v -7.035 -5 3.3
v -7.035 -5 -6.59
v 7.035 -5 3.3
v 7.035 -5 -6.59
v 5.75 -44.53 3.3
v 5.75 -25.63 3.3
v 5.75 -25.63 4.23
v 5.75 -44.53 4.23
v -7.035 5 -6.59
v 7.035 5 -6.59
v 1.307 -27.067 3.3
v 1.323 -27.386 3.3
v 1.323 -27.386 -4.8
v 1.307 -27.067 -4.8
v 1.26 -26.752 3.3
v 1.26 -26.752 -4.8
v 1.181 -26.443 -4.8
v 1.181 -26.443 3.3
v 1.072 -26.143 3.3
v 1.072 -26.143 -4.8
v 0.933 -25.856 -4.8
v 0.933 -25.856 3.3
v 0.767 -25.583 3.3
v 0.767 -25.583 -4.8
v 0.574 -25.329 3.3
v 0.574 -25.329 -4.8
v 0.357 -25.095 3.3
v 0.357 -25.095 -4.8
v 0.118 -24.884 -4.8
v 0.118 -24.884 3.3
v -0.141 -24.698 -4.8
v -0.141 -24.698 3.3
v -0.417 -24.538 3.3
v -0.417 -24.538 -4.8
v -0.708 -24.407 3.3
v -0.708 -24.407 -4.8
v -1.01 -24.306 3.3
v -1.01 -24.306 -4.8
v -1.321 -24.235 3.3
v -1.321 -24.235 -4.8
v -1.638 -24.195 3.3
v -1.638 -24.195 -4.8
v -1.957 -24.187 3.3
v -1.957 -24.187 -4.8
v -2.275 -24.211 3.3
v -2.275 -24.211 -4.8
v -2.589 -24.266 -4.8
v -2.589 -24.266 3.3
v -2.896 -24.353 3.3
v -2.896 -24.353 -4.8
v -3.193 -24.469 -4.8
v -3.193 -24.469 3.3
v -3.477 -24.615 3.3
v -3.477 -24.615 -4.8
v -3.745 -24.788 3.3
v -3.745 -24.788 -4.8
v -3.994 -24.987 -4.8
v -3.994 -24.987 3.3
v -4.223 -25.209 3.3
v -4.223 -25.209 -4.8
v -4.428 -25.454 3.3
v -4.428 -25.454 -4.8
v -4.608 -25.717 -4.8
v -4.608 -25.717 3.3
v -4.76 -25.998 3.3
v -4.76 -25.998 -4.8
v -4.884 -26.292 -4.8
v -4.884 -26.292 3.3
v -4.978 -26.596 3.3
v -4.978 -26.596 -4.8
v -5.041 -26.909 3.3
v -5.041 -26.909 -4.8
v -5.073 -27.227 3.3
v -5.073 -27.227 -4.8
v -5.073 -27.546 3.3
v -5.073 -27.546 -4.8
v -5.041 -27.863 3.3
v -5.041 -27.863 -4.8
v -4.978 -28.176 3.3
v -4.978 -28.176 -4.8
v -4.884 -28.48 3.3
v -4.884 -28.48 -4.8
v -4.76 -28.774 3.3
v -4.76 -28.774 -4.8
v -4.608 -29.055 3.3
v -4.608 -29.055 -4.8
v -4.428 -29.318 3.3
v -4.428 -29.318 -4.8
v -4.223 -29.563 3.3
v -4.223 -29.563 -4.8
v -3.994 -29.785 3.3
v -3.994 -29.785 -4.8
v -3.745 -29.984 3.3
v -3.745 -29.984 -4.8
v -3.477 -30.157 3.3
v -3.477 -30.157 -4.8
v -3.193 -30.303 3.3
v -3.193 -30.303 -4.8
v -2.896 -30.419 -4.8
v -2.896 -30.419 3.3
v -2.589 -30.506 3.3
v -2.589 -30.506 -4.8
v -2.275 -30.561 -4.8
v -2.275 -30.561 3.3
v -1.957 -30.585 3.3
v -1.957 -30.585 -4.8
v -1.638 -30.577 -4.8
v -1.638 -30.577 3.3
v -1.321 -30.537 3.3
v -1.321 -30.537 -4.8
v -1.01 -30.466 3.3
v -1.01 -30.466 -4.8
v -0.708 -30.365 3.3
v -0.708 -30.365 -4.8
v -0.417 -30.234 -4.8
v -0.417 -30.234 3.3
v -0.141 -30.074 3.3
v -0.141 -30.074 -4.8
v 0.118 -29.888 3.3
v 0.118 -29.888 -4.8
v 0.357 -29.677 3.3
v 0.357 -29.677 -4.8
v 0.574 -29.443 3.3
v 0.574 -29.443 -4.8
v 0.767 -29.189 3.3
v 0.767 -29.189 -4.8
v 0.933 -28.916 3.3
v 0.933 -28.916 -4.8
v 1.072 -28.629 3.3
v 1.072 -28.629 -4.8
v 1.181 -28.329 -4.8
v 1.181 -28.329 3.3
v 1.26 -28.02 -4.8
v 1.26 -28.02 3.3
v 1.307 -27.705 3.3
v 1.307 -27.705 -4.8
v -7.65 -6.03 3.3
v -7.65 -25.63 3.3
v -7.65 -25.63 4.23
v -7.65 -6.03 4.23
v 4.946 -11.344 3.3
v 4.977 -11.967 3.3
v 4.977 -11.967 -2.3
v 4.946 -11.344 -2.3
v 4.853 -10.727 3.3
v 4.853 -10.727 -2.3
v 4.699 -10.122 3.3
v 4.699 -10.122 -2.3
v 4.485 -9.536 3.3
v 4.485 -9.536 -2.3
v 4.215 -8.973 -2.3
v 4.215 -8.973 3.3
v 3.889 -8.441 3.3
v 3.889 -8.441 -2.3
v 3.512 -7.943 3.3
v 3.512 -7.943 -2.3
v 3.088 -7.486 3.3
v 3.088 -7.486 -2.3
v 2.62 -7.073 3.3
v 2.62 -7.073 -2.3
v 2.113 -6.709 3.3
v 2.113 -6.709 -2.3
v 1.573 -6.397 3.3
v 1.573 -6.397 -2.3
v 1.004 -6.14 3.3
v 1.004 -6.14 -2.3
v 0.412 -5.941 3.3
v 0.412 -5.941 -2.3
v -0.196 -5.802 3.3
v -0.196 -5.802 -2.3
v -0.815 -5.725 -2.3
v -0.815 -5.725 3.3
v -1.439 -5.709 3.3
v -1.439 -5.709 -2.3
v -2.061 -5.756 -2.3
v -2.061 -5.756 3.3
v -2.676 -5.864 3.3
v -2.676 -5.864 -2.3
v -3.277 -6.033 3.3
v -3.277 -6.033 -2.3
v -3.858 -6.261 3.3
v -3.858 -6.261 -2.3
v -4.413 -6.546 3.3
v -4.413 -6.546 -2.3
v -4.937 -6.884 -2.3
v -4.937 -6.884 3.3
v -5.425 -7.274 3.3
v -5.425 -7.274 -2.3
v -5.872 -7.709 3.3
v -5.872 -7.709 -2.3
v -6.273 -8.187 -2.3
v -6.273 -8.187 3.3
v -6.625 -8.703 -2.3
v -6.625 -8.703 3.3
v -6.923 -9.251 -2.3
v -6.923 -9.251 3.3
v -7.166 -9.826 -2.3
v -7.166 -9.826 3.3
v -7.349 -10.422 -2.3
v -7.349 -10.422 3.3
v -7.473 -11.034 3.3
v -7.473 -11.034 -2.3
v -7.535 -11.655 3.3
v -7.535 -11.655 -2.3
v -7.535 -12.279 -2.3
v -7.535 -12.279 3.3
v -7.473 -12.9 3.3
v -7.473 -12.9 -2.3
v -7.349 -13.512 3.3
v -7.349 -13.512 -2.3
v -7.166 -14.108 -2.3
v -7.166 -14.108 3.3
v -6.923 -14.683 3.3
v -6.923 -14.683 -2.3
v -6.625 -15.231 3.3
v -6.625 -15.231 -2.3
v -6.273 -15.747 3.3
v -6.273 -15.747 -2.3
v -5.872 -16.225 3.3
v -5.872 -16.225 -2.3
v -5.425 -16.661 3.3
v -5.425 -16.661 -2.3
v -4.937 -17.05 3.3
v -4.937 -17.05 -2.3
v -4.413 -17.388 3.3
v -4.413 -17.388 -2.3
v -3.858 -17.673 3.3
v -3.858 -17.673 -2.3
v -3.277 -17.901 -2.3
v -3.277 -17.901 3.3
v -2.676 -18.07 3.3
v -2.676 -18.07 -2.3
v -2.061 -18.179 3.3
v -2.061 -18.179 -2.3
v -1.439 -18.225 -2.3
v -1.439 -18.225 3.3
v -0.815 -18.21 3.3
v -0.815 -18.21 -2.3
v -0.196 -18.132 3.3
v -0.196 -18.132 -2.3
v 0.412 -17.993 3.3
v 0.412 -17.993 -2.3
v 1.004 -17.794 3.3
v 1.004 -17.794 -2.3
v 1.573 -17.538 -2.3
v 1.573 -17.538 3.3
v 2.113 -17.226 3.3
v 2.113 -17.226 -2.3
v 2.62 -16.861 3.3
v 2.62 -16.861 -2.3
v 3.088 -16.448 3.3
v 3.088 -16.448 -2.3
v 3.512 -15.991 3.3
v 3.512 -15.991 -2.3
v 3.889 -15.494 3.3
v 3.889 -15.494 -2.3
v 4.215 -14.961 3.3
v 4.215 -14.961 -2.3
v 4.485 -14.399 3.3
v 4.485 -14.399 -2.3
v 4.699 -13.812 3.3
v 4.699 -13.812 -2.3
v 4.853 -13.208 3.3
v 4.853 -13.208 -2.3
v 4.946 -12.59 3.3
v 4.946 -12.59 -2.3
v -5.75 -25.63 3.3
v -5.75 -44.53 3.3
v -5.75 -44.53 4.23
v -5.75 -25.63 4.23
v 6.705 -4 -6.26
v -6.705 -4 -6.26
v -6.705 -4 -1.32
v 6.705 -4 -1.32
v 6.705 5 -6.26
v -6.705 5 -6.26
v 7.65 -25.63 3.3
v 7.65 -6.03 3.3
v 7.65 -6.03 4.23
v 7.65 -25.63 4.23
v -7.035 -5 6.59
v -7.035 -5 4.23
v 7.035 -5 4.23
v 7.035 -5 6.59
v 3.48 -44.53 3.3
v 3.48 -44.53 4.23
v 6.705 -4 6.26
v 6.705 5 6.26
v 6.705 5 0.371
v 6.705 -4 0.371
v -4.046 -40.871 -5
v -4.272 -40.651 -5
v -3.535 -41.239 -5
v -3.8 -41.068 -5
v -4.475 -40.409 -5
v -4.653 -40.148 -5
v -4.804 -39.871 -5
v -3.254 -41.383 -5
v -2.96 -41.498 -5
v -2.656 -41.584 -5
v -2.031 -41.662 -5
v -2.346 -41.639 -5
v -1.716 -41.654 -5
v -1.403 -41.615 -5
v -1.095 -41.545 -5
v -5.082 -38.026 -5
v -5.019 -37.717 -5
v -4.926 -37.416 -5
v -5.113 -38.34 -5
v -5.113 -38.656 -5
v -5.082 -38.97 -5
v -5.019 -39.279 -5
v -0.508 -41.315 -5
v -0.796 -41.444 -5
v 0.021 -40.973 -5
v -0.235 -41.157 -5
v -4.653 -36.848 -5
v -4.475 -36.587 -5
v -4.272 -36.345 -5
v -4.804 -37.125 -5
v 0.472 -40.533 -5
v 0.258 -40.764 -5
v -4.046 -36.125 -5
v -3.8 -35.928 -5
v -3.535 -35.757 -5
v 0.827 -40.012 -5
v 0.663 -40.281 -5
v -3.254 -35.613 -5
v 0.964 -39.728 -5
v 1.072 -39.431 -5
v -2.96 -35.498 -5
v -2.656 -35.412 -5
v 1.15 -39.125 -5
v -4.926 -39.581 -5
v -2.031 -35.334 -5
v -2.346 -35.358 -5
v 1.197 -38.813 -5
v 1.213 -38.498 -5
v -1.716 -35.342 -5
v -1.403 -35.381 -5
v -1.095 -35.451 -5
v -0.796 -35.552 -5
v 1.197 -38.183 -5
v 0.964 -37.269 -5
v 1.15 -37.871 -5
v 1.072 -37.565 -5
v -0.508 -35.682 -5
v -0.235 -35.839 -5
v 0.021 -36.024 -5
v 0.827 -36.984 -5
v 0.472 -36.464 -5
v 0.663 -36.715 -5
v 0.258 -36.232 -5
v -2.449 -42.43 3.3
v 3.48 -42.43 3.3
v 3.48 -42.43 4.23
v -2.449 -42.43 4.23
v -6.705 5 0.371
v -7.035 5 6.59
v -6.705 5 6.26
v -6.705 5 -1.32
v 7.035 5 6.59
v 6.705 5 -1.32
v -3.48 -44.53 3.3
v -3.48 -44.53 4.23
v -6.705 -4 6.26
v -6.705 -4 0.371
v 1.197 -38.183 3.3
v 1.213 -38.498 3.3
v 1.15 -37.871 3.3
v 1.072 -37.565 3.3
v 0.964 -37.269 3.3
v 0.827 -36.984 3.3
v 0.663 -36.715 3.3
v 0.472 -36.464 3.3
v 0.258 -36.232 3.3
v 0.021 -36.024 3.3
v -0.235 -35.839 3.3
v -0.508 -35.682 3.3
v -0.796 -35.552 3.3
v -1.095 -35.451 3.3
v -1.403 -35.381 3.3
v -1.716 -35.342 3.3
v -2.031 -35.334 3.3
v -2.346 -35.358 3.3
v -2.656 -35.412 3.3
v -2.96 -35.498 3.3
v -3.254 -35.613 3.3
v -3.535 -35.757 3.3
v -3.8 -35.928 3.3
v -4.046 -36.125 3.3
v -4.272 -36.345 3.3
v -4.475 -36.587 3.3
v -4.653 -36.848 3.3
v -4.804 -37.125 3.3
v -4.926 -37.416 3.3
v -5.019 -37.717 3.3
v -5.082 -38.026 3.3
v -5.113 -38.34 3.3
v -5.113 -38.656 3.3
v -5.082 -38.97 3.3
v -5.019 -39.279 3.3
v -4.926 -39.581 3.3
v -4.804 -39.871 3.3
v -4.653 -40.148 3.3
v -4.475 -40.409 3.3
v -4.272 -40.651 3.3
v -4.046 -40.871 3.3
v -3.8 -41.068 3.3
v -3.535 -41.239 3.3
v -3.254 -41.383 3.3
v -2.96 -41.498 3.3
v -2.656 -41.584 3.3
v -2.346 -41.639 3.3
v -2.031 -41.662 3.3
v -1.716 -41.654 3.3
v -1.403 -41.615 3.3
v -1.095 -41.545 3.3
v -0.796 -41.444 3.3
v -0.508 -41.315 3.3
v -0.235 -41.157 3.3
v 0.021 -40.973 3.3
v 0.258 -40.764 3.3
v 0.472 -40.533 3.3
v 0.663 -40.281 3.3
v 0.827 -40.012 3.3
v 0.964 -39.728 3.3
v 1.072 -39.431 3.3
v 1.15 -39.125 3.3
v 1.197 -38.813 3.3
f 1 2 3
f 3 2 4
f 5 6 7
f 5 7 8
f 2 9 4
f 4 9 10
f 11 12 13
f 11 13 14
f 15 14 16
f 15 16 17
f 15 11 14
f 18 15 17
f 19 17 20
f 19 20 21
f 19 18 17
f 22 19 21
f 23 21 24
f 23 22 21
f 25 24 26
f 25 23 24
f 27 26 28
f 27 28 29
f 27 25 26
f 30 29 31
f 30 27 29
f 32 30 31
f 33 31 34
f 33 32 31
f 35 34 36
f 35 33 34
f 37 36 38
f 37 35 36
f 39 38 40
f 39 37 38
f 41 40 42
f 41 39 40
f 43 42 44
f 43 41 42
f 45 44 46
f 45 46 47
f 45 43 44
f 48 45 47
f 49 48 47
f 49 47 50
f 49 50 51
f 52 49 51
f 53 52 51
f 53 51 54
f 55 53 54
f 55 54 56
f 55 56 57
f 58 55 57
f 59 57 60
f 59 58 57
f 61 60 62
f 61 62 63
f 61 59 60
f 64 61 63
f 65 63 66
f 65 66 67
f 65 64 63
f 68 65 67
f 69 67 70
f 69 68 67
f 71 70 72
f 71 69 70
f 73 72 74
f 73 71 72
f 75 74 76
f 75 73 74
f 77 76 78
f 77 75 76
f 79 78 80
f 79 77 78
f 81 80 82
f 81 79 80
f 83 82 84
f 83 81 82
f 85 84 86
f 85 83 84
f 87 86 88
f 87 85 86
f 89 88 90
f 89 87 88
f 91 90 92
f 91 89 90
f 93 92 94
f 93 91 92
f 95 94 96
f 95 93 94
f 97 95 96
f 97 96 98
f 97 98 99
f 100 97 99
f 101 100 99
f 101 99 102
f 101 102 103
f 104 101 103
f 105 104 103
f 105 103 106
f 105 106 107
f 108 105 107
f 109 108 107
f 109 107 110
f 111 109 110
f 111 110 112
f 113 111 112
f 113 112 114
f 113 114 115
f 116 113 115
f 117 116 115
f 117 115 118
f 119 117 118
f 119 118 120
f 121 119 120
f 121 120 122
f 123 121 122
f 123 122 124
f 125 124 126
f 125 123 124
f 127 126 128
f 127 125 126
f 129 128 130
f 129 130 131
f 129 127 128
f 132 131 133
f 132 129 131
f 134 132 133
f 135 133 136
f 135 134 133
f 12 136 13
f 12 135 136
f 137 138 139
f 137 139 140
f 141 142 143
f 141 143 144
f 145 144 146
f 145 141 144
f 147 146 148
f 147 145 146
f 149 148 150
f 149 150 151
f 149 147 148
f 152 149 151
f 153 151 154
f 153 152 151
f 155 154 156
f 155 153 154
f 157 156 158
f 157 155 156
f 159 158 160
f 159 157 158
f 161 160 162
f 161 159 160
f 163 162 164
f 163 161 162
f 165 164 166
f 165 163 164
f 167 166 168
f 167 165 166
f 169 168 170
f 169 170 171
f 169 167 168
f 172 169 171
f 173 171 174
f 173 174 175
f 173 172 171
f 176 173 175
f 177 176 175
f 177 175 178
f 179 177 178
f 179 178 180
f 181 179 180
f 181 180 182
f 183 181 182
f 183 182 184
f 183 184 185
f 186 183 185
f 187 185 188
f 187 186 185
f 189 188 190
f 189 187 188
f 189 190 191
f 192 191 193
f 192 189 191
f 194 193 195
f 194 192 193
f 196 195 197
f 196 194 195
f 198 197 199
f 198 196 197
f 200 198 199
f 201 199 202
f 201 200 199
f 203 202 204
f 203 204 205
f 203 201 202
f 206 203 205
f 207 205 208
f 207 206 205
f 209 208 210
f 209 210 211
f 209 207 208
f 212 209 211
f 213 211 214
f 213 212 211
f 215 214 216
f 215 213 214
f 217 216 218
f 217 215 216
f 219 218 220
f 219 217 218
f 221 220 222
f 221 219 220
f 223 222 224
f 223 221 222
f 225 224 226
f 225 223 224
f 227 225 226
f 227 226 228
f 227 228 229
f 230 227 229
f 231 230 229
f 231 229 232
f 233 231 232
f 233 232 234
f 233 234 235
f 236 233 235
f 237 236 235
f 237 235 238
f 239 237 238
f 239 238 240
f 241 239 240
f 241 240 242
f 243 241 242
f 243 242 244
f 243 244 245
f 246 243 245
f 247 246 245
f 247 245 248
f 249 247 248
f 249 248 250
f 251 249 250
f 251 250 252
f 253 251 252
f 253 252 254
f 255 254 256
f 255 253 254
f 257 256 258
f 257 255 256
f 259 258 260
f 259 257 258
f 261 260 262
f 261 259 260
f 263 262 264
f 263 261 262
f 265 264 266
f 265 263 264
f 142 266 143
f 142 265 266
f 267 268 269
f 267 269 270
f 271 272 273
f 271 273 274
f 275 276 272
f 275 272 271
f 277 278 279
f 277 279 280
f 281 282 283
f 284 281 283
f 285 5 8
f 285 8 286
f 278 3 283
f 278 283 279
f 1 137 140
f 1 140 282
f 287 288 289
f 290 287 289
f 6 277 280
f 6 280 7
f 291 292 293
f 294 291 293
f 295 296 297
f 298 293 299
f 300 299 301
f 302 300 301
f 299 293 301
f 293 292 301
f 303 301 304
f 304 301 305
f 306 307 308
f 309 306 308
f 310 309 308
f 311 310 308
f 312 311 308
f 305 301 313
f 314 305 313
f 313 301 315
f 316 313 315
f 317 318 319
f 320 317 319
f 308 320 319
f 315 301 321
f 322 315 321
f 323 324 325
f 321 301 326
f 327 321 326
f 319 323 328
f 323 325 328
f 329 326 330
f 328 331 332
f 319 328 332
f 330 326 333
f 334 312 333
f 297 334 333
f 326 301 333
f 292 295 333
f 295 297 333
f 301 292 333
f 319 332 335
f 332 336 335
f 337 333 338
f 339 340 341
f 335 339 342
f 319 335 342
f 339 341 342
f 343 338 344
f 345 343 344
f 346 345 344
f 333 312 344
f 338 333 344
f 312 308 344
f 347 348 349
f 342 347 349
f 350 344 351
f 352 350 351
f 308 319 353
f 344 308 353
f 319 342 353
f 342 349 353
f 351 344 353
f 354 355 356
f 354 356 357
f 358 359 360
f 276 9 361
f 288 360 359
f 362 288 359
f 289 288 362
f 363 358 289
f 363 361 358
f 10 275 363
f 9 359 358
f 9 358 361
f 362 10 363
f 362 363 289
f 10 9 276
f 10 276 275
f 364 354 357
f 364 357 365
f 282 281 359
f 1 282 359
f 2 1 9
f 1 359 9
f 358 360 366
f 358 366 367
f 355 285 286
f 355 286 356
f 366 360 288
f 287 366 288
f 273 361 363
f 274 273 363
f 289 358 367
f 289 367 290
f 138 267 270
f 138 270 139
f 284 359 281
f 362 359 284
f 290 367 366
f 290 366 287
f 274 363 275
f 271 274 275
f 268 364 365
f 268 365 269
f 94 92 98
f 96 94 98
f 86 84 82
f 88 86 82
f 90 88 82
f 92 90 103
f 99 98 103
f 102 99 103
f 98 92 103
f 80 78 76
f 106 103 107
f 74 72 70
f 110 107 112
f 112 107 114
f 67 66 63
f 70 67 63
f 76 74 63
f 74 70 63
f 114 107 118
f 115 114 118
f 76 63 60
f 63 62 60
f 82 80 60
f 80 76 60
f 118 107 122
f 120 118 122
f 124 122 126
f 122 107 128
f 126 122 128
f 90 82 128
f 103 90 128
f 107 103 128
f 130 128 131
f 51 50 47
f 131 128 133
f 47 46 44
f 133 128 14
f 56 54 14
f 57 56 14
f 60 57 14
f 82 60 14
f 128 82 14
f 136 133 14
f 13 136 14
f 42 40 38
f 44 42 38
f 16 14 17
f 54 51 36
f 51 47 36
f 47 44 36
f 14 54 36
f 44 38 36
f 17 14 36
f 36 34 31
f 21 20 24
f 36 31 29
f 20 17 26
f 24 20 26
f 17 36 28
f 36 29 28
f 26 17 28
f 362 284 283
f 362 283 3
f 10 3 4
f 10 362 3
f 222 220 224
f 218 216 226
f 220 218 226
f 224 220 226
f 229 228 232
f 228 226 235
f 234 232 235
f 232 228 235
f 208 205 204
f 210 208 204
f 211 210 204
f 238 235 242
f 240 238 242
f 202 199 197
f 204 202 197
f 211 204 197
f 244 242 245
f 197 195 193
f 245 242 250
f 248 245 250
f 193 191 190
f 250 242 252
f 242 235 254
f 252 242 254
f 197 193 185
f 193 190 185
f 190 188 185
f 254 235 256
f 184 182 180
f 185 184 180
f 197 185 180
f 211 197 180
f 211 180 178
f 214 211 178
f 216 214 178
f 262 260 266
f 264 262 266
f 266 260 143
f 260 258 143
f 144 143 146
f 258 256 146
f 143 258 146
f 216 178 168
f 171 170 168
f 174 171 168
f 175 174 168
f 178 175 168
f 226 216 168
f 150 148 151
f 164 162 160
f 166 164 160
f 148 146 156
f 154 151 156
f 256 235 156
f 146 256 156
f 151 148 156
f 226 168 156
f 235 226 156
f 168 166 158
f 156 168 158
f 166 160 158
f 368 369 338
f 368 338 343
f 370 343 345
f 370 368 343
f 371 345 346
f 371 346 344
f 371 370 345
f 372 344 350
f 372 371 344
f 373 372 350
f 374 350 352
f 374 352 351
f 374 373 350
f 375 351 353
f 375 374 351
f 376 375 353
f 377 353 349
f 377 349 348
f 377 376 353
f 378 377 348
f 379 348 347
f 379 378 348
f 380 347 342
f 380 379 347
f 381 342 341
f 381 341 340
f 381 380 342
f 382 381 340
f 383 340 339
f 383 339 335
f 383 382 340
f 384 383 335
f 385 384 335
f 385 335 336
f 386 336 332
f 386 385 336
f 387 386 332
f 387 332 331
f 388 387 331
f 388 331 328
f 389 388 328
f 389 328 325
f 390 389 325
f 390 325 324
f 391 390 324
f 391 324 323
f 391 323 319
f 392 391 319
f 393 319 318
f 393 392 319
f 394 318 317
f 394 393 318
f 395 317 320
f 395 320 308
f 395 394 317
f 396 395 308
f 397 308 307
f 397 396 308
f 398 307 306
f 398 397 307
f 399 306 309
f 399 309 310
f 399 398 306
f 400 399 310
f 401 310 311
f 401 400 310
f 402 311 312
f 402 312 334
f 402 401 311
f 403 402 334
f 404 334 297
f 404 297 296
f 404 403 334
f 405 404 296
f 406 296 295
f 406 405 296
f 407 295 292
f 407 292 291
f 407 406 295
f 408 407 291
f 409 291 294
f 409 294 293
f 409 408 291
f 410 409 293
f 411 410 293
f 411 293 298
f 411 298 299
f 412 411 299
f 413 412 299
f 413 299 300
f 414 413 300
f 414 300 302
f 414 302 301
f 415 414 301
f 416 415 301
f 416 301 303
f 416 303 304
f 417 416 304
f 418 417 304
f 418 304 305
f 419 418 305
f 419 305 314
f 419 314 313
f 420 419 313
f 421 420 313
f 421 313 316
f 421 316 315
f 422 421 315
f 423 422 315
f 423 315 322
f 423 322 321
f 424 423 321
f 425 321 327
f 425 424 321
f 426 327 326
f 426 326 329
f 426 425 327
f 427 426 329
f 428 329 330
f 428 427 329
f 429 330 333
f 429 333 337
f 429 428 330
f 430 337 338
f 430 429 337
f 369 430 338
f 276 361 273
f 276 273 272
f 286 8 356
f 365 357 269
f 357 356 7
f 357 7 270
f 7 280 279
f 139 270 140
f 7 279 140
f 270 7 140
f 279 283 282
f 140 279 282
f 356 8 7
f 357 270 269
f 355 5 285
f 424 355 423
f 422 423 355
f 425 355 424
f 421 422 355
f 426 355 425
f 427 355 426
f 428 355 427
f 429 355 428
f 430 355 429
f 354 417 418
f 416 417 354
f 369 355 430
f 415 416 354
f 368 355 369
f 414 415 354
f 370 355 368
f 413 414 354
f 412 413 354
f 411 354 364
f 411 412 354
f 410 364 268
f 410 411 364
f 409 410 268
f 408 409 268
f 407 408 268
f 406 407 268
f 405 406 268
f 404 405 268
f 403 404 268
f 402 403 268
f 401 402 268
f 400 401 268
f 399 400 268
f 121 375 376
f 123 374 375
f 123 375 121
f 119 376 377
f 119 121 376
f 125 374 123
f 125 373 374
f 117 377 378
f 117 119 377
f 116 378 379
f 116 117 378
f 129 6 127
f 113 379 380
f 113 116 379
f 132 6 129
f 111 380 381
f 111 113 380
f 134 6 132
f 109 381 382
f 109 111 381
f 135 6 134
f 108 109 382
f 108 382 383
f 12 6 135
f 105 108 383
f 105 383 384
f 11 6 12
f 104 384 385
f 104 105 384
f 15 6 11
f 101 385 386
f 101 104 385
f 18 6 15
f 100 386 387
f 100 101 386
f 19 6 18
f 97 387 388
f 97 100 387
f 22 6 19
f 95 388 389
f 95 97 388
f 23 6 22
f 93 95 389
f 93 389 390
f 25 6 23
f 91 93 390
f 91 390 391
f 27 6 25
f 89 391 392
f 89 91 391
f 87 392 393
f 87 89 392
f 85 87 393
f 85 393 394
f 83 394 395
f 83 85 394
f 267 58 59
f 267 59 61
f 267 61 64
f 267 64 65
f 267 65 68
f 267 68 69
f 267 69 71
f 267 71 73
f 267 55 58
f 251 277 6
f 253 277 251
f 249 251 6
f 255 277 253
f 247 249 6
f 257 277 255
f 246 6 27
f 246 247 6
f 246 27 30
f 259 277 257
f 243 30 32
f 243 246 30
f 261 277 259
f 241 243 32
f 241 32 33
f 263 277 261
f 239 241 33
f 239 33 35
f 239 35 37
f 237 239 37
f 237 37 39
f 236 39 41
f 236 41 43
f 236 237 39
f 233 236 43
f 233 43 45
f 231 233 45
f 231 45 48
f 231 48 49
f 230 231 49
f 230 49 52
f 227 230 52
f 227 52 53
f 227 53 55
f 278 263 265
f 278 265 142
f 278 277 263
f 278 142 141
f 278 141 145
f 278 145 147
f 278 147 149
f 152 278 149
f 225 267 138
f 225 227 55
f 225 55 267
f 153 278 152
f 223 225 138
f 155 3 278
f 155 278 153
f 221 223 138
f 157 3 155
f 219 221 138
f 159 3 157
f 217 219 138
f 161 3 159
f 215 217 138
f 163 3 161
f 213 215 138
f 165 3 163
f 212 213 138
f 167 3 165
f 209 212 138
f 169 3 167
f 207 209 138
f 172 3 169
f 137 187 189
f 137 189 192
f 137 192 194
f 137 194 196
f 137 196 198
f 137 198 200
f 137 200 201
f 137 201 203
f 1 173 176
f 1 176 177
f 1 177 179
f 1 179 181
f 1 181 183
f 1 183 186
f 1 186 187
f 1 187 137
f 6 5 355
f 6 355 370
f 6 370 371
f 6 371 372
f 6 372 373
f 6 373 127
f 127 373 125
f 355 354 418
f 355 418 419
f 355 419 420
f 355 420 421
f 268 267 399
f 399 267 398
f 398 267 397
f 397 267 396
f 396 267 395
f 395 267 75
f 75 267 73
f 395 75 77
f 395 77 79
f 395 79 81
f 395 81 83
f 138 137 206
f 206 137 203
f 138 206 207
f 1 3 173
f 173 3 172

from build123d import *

# Parameters (mm, degrees)
SKETCH1_W           = 14.07
SKETCH1_H           = 13.18
BOSS_EXTRUDE1_DEPTH = 5
SKETCH2_W           = 13.41
SKETCH2_H           = 4.94
SKETCH2_H_2         = 5.888730893
CUT_EXTRUDE1_DEPTH  = 9
BOSS_EXTRUDE2_START = 3.3
BOSS_EXTRUDE2_DEPTH = 0.93
BOSS_EXTRUDE3_START = 3.3
SKETCH5_R           = 6.26
BOSS_EXTRUDE3_DEPTH = 5.6
BOSS_EXTRUDE4_START = 3.3
SKETCH7_R           = 3.2
BOSS_EXTRUDE4_DEPTH = 8.1
BOSS_EXTRUDE5_START = 3.3
SKETCH8_R           = 3.165
BOSS_EXTRUDE5_DEPTH = 8.3


with BuildPart() as part:
    # Sketch1 → Boss-Extrude1 (new body, symmetric)
    with BuildSketch(Plane(origin=(0, 0, 0), x_dir=(1, 0, 0), z_dir=(0, 1, 0))):
        Rectangle(SKETCH1_W, SKETCH1_H)
    extrude(amount=BOSS_EXTRUDE1_DEPTH, both=True)

    # Sketch2 → Cut-Extrude1 (cut)
    with BuildSketch(Plane(origin=(0, 5, 0), x_dir=(1, 0, 0), z_dir=(0, 1, 0))):
        with Locations((0, 3.79)):
            Rectangle(SKETCH2_W, SKETCH2_H)
        with Locations((0, -3.315634554)):
            Rectangle(SKETCH2_W, SKETCH2_H_2)
    extrude(amount=-CUT_EXTRUDE1_DEPTH, mode=Mode.SUBTRACT)

    # Sketch3 → Boss-Extrude2 (add)
    with BuildSketch(Plane.XY.offset(BOSS_EXTRUDE2_START)):
        Polygon((7.035, -5), (7.65, -6.03042467), (7.65, -25.63042467), (5.75, -25.63042467), (5.75, -44.53042467), (3.48, -44.53042467), (3.48, -42.43042467), (-2.448967454, -42.43042467), (-3.48, -44.53042467), (-5.75, -44.53042467), (-5.75, -25.63042467), (-7.65, -25.63042467), (-7.65, -6.03042467), (-7.035, -5), align=None)
    extrude(amount=BOSS_EXTRUDE2_DEPTH)

    # Sketch5 → Boss-Extrude3 (add)
    with BuildSketch(Plane.XY.offset(BOSS_EXTRUDE3_START)):
        with Locations((-1.283039212, -11.96715887)):
            Circle(SKETCH5_R)
    extrude(amount=-BOSS_EXTRUDE3_DEPTH)

    # Sketch7 → Boss-Extrude4 (add)
    with BuildSketch(Plane.XY.offset(BOSS_EXTRUDE4_START)):
        with Locations((-1.877046038, -27.386019249)):
            Circle(SKETCH7_R)
    extrude(amount=-BOSS_EXTRUDE4_DEPTH)

    # Sketch8 → Boss-Extrude5 (add)
    with BuildSketch(Plane.XY.offset(BOSS_EXTRUDE5_START)):
        with Locations((-1.952127879, -38.498131793)):
            Circle(SKETCH8_R)
    extrude(amount=-BOSS_EXTRUDE5_DEPTH)


solid = part.part
